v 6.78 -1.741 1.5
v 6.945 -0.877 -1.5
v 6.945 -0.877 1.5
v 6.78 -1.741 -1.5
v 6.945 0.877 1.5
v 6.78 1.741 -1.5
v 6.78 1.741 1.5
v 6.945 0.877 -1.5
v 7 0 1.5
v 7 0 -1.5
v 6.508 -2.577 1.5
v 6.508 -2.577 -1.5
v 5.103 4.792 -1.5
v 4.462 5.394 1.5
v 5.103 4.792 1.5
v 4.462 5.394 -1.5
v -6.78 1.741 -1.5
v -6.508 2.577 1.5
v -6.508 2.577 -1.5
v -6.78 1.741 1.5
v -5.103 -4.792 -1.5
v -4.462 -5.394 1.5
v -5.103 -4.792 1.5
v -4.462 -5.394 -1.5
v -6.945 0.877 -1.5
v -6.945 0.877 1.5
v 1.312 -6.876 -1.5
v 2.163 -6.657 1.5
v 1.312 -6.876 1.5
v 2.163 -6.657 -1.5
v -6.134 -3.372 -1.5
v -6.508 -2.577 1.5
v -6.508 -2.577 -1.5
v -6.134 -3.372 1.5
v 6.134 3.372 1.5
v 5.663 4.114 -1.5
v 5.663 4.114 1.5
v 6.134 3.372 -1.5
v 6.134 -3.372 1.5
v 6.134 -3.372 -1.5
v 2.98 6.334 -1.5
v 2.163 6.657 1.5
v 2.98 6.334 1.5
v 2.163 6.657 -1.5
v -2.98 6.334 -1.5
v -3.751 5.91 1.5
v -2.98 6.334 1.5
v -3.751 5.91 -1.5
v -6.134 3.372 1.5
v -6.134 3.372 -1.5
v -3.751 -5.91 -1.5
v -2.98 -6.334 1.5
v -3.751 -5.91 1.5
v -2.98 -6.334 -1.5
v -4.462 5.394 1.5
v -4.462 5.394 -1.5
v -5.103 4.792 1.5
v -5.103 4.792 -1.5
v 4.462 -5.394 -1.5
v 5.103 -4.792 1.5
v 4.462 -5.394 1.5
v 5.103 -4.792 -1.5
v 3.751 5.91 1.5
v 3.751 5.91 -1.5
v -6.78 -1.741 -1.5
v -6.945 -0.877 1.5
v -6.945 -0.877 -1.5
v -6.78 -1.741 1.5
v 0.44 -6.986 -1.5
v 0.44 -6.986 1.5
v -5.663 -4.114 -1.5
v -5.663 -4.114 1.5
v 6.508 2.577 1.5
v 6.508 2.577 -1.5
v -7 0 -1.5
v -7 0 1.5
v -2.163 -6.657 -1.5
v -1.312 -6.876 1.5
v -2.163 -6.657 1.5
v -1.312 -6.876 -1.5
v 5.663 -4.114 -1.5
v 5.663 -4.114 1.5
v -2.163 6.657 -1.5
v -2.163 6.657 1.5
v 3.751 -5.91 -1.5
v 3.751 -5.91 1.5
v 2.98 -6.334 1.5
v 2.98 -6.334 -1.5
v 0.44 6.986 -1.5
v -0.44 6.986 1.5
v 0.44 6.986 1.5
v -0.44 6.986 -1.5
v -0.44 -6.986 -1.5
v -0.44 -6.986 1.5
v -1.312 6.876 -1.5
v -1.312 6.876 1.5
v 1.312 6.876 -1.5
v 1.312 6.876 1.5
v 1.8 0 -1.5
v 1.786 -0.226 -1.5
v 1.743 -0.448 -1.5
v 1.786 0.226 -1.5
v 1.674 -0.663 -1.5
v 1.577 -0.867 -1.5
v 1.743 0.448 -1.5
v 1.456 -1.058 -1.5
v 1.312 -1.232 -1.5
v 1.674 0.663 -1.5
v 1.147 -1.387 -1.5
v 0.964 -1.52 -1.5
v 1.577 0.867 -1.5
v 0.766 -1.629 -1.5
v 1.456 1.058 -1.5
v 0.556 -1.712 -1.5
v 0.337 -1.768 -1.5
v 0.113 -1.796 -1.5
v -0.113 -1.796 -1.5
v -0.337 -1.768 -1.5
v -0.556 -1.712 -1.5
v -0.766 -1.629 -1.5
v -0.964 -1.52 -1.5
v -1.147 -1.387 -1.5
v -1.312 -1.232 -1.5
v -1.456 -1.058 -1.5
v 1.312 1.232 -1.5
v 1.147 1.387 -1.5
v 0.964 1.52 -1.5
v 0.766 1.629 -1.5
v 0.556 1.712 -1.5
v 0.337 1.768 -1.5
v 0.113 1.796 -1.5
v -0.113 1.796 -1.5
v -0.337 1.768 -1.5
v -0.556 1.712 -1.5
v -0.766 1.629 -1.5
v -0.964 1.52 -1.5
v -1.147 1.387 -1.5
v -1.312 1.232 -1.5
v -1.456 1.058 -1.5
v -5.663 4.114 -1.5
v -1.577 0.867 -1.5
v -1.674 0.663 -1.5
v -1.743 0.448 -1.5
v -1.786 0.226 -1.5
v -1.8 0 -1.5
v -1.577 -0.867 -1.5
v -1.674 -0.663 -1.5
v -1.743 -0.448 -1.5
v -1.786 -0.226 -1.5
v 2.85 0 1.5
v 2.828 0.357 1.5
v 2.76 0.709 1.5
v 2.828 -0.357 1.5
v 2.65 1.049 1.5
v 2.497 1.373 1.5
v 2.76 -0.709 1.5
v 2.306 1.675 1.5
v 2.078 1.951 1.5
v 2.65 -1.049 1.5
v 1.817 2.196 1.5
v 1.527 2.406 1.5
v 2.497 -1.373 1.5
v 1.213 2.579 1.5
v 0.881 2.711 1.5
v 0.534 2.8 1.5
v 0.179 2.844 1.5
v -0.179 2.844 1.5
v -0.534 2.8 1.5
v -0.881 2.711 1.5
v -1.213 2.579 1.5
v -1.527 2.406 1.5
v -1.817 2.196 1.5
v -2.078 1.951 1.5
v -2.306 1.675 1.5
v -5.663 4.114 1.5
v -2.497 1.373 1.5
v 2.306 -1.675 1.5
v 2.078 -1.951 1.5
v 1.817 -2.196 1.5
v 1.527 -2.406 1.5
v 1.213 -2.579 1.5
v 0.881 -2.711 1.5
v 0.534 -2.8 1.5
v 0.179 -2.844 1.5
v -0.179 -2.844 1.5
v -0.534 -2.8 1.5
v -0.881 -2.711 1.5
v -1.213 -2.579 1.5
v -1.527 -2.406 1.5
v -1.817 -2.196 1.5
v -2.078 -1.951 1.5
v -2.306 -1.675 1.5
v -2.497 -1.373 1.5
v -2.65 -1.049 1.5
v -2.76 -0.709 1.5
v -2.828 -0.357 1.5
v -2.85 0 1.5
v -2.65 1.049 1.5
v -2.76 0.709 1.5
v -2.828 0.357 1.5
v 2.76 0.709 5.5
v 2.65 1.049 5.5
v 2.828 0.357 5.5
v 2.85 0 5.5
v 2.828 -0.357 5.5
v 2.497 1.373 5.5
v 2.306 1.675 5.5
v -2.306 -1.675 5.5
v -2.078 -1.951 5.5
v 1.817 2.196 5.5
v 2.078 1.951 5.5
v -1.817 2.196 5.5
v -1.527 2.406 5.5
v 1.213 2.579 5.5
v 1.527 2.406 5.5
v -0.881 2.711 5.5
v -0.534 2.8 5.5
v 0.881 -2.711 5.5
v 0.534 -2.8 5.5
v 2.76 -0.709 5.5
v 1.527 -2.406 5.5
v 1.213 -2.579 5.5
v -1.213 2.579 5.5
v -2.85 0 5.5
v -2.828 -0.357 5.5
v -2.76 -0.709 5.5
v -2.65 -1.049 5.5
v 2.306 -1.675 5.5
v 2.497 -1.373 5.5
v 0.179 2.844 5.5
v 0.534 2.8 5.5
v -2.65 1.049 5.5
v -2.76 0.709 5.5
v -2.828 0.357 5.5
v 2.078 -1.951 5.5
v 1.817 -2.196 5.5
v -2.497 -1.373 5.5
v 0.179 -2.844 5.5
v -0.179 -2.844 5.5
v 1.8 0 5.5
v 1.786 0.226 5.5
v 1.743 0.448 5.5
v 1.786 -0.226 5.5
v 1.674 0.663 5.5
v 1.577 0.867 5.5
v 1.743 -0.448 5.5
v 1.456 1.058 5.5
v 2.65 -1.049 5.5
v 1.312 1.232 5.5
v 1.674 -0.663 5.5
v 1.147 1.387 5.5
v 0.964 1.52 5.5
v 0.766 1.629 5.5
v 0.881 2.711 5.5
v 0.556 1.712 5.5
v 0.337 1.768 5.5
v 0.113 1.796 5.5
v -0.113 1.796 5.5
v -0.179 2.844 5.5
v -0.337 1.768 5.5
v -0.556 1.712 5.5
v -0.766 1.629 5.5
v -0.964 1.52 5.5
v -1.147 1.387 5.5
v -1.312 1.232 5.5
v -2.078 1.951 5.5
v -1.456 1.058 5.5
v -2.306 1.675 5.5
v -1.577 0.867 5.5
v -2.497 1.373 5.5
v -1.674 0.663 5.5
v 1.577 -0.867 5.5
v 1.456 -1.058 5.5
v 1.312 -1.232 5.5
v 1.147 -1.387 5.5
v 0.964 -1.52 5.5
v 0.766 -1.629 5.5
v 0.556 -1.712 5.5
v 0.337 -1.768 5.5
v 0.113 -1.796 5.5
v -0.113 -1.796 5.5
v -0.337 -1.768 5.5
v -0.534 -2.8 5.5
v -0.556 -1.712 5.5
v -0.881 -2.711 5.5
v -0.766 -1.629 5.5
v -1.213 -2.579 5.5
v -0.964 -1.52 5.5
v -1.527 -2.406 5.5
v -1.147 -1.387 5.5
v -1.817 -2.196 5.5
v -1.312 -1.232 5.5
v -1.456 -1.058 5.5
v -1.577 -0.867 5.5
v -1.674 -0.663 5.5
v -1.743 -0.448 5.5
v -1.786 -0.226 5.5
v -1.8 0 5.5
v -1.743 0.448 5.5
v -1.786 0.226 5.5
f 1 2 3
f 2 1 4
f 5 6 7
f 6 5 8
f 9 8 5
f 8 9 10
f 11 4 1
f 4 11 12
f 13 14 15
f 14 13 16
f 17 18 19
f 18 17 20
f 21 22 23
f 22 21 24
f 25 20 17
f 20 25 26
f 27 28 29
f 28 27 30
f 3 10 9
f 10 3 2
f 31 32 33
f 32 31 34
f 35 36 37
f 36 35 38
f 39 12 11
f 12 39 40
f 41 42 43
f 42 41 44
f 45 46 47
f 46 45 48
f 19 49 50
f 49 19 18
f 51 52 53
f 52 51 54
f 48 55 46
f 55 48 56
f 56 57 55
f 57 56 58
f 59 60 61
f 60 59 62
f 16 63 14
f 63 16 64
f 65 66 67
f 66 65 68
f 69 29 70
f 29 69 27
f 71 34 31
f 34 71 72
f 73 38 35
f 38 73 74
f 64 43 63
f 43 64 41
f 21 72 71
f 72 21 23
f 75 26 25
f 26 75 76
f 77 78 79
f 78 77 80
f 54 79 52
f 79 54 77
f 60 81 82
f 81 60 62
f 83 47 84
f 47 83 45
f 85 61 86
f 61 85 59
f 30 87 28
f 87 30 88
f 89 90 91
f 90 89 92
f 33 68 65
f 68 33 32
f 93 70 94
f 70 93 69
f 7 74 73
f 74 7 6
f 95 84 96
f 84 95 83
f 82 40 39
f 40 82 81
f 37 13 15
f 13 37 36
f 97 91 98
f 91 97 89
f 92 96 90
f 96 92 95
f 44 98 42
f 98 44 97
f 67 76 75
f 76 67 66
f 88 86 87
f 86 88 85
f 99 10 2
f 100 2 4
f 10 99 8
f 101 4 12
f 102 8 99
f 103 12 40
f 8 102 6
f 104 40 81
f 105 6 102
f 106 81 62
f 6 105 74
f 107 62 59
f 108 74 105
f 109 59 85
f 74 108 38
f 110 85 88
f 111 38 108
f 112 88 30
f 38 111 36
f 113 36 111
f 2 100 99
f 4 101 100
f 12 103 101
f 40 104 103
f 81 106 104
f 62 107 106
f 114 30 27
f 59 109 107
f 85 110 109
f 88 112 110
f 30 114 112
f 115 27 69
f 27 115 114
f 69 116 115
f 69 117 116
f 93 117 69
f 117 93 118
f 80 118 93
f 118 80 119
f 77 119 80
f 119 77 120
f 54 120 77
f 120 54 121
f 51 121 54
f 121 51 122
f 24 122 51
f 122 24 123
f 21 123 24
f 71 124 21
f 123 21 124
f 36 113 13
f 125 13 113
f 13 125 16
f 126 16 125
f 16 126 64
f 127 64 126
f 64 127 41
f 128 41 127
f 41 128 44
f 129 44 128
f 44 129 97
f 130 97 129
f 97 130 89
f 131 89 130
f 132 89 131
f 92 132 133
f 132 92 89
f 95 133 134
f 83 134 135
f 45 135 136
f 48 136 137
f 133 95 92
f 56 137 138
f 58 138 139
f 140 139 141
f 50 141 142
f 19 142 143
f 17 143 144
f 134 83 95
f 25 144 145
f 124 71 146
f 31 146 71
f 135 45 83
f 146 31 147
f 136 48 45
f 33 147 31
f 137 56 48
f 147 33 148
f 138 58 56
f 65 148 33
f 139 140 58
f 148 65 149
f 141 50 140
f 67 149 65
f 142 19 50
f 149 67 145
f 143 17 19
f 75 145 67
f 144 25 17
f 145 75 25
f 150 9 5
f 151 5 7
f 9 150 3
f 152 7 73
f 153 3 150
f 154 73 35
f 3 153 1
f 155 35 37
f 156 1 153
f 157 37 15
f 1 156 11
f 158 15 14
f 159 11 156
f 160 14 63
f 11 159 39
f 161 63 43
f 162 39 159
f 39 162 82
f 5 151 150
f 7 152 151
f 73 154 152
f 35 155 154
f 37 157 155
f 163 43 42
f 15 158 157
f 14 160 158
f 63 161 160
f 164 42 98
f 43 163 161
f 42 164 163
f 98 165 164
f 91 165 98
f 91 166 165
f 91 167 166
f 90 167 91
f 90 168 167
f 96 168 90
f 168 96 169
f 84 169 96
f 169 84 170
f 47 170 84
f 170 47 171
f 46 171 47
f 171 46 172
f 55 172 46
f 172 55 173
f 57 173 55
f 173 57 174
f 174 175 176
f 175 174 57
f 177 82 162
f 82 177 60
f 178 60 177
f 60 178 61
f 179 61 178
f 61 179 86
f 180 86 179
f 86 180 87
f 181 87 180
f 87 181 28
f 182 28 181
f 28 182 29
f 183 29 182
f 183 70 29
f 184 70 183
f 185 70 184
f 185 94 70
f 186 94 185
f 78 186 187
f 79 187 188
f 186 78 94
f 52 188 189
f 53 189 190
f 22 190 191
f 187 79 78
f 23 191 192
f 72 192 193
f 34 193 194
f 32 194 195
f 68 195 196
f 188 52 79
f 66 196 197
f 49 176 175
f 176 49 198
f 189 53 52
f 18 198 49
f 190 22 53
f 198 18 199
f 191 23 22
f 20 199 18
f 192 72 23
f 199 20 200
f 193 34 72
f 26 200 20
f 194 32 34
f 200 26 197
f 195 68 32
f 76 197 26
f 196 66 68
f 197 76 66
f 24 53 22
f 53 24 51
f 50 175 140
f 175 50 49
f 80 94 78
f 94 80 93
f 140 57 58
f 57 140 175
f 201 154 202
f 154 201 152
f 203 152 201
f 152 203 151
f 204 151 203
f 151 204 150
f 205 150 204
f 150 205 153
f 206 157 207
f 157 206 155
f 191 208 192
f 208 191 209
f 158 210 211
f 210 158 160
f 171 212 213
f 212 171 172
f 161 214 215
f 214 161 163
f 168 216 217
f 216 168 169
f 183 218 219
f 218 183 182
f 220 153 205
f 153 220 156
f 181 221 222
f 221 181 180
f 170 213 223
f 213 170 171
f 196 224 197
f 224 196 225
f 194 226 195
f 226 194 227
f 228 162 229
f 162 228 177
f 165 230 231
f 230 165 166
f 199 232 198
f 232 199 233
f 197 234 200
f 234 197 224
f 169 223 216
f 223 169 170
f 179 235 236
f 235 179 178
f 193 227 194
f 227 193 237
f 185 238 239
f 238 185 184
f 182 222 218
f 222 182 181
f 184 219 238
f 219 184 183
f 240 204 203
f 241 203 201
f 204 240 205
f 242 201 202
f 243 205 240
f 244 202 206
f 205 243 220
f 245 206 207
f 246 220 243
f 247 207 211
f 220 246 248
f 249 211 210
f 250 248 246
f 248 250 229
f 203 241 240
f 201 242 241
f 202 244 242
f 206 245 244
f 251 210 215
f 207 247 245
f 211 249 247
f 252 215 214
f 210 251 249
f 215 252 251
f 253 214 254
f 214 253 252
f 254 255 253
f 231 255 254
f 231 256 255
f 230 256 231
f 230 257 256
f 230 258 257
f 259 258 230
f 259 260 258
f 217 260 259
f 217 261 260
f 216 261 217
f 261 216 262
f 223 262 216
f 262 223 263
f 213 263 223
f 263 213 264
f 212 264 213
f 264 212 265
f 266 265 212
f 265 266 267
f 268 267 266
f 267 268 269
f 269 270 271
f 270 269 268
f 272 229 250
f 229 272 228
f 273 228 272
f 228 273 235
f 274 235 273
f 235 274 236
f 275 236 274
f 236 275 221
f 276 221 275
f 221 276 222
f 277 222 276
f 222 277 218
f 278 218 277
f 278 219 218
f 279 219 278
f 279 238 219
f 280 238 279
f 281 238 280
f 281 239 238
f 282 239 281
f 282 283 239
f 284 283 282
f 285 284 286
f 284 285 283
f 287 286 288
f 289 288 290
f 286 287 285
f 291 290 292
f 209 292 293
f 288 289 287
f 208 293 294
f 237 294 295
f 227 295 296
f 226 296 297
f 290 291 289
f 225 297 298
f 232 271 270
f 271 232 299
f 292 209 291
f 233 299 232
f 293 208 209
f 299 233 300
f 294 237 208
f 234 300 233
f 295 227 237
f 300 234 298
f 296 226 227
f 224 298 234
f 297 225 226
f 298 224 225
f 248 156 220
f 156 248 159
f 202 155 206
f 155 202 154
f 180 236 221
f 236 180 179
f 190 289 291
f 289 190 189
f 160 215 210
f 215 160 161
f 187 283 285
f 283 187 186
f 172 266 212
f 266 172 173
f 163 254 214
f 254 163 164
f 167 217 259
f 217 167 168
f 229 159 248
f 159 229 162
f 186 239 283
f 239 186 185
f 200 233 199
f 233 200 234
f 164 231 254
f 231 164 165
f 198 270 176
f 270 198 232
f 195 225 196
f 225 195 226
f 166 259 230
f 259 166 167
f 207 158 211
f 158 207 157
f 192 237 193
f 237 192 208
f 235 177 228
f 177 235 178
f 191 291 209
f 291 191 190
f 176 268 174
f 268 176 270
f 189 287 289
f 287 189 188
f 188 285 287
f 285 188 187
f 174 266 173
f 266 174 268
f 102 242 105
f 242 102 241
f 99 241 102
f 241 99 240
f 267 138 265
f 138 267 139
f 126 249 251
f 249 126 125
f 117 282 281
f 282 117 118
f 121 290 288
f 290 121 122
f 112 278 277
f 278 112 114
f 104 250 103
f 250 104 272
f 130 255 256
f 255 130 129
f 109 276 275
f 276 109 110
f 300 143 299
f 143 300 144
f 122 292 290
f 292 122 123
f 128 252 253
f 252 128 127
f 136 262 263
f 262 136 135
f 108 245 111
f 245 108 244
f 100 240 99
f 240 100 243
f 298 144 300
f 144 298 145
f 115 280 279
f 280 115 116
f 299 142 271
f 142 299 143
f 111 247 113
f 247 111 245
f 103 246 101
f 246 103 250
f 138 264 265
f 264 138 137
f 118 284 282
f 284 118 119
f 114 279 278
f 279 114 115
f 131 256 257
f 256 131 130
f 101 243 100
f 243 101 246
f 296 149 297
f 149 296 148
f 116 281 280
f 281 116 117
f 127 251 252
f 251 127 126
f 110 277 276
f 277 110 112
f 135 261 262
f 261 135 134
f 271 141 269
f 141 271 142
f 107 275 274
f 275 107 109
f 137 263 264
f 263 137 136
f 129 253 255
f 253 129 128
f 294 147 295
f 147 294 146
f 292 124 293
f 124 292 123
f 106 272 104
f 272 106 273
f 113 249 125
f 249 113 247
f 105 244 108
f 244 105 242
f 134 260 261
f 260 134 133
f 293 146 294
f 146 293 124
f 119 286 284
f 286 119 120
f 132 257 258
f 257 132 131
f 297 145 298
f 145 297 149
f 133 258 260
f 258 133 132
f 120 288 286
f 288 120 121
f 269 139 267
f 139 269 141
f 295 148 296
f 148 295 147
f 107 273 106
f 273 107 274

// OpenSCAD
$fn = 50;


difference() {
	union() {
		translate(v = [0, 0, -1.5000000000]) {
			cylinder(h = 3, r = 7.0000000000);
		}
		translate(v = [0, 0, -1.5000000000]) {
			cylinder(h = 7, r = 2.8500000000);
		}
	}
	union() {
		translate(v = [0, 0, -100.0000000000]) {
			cylinder(h = 200, r = 1.8000000000);
		}
	}
}
